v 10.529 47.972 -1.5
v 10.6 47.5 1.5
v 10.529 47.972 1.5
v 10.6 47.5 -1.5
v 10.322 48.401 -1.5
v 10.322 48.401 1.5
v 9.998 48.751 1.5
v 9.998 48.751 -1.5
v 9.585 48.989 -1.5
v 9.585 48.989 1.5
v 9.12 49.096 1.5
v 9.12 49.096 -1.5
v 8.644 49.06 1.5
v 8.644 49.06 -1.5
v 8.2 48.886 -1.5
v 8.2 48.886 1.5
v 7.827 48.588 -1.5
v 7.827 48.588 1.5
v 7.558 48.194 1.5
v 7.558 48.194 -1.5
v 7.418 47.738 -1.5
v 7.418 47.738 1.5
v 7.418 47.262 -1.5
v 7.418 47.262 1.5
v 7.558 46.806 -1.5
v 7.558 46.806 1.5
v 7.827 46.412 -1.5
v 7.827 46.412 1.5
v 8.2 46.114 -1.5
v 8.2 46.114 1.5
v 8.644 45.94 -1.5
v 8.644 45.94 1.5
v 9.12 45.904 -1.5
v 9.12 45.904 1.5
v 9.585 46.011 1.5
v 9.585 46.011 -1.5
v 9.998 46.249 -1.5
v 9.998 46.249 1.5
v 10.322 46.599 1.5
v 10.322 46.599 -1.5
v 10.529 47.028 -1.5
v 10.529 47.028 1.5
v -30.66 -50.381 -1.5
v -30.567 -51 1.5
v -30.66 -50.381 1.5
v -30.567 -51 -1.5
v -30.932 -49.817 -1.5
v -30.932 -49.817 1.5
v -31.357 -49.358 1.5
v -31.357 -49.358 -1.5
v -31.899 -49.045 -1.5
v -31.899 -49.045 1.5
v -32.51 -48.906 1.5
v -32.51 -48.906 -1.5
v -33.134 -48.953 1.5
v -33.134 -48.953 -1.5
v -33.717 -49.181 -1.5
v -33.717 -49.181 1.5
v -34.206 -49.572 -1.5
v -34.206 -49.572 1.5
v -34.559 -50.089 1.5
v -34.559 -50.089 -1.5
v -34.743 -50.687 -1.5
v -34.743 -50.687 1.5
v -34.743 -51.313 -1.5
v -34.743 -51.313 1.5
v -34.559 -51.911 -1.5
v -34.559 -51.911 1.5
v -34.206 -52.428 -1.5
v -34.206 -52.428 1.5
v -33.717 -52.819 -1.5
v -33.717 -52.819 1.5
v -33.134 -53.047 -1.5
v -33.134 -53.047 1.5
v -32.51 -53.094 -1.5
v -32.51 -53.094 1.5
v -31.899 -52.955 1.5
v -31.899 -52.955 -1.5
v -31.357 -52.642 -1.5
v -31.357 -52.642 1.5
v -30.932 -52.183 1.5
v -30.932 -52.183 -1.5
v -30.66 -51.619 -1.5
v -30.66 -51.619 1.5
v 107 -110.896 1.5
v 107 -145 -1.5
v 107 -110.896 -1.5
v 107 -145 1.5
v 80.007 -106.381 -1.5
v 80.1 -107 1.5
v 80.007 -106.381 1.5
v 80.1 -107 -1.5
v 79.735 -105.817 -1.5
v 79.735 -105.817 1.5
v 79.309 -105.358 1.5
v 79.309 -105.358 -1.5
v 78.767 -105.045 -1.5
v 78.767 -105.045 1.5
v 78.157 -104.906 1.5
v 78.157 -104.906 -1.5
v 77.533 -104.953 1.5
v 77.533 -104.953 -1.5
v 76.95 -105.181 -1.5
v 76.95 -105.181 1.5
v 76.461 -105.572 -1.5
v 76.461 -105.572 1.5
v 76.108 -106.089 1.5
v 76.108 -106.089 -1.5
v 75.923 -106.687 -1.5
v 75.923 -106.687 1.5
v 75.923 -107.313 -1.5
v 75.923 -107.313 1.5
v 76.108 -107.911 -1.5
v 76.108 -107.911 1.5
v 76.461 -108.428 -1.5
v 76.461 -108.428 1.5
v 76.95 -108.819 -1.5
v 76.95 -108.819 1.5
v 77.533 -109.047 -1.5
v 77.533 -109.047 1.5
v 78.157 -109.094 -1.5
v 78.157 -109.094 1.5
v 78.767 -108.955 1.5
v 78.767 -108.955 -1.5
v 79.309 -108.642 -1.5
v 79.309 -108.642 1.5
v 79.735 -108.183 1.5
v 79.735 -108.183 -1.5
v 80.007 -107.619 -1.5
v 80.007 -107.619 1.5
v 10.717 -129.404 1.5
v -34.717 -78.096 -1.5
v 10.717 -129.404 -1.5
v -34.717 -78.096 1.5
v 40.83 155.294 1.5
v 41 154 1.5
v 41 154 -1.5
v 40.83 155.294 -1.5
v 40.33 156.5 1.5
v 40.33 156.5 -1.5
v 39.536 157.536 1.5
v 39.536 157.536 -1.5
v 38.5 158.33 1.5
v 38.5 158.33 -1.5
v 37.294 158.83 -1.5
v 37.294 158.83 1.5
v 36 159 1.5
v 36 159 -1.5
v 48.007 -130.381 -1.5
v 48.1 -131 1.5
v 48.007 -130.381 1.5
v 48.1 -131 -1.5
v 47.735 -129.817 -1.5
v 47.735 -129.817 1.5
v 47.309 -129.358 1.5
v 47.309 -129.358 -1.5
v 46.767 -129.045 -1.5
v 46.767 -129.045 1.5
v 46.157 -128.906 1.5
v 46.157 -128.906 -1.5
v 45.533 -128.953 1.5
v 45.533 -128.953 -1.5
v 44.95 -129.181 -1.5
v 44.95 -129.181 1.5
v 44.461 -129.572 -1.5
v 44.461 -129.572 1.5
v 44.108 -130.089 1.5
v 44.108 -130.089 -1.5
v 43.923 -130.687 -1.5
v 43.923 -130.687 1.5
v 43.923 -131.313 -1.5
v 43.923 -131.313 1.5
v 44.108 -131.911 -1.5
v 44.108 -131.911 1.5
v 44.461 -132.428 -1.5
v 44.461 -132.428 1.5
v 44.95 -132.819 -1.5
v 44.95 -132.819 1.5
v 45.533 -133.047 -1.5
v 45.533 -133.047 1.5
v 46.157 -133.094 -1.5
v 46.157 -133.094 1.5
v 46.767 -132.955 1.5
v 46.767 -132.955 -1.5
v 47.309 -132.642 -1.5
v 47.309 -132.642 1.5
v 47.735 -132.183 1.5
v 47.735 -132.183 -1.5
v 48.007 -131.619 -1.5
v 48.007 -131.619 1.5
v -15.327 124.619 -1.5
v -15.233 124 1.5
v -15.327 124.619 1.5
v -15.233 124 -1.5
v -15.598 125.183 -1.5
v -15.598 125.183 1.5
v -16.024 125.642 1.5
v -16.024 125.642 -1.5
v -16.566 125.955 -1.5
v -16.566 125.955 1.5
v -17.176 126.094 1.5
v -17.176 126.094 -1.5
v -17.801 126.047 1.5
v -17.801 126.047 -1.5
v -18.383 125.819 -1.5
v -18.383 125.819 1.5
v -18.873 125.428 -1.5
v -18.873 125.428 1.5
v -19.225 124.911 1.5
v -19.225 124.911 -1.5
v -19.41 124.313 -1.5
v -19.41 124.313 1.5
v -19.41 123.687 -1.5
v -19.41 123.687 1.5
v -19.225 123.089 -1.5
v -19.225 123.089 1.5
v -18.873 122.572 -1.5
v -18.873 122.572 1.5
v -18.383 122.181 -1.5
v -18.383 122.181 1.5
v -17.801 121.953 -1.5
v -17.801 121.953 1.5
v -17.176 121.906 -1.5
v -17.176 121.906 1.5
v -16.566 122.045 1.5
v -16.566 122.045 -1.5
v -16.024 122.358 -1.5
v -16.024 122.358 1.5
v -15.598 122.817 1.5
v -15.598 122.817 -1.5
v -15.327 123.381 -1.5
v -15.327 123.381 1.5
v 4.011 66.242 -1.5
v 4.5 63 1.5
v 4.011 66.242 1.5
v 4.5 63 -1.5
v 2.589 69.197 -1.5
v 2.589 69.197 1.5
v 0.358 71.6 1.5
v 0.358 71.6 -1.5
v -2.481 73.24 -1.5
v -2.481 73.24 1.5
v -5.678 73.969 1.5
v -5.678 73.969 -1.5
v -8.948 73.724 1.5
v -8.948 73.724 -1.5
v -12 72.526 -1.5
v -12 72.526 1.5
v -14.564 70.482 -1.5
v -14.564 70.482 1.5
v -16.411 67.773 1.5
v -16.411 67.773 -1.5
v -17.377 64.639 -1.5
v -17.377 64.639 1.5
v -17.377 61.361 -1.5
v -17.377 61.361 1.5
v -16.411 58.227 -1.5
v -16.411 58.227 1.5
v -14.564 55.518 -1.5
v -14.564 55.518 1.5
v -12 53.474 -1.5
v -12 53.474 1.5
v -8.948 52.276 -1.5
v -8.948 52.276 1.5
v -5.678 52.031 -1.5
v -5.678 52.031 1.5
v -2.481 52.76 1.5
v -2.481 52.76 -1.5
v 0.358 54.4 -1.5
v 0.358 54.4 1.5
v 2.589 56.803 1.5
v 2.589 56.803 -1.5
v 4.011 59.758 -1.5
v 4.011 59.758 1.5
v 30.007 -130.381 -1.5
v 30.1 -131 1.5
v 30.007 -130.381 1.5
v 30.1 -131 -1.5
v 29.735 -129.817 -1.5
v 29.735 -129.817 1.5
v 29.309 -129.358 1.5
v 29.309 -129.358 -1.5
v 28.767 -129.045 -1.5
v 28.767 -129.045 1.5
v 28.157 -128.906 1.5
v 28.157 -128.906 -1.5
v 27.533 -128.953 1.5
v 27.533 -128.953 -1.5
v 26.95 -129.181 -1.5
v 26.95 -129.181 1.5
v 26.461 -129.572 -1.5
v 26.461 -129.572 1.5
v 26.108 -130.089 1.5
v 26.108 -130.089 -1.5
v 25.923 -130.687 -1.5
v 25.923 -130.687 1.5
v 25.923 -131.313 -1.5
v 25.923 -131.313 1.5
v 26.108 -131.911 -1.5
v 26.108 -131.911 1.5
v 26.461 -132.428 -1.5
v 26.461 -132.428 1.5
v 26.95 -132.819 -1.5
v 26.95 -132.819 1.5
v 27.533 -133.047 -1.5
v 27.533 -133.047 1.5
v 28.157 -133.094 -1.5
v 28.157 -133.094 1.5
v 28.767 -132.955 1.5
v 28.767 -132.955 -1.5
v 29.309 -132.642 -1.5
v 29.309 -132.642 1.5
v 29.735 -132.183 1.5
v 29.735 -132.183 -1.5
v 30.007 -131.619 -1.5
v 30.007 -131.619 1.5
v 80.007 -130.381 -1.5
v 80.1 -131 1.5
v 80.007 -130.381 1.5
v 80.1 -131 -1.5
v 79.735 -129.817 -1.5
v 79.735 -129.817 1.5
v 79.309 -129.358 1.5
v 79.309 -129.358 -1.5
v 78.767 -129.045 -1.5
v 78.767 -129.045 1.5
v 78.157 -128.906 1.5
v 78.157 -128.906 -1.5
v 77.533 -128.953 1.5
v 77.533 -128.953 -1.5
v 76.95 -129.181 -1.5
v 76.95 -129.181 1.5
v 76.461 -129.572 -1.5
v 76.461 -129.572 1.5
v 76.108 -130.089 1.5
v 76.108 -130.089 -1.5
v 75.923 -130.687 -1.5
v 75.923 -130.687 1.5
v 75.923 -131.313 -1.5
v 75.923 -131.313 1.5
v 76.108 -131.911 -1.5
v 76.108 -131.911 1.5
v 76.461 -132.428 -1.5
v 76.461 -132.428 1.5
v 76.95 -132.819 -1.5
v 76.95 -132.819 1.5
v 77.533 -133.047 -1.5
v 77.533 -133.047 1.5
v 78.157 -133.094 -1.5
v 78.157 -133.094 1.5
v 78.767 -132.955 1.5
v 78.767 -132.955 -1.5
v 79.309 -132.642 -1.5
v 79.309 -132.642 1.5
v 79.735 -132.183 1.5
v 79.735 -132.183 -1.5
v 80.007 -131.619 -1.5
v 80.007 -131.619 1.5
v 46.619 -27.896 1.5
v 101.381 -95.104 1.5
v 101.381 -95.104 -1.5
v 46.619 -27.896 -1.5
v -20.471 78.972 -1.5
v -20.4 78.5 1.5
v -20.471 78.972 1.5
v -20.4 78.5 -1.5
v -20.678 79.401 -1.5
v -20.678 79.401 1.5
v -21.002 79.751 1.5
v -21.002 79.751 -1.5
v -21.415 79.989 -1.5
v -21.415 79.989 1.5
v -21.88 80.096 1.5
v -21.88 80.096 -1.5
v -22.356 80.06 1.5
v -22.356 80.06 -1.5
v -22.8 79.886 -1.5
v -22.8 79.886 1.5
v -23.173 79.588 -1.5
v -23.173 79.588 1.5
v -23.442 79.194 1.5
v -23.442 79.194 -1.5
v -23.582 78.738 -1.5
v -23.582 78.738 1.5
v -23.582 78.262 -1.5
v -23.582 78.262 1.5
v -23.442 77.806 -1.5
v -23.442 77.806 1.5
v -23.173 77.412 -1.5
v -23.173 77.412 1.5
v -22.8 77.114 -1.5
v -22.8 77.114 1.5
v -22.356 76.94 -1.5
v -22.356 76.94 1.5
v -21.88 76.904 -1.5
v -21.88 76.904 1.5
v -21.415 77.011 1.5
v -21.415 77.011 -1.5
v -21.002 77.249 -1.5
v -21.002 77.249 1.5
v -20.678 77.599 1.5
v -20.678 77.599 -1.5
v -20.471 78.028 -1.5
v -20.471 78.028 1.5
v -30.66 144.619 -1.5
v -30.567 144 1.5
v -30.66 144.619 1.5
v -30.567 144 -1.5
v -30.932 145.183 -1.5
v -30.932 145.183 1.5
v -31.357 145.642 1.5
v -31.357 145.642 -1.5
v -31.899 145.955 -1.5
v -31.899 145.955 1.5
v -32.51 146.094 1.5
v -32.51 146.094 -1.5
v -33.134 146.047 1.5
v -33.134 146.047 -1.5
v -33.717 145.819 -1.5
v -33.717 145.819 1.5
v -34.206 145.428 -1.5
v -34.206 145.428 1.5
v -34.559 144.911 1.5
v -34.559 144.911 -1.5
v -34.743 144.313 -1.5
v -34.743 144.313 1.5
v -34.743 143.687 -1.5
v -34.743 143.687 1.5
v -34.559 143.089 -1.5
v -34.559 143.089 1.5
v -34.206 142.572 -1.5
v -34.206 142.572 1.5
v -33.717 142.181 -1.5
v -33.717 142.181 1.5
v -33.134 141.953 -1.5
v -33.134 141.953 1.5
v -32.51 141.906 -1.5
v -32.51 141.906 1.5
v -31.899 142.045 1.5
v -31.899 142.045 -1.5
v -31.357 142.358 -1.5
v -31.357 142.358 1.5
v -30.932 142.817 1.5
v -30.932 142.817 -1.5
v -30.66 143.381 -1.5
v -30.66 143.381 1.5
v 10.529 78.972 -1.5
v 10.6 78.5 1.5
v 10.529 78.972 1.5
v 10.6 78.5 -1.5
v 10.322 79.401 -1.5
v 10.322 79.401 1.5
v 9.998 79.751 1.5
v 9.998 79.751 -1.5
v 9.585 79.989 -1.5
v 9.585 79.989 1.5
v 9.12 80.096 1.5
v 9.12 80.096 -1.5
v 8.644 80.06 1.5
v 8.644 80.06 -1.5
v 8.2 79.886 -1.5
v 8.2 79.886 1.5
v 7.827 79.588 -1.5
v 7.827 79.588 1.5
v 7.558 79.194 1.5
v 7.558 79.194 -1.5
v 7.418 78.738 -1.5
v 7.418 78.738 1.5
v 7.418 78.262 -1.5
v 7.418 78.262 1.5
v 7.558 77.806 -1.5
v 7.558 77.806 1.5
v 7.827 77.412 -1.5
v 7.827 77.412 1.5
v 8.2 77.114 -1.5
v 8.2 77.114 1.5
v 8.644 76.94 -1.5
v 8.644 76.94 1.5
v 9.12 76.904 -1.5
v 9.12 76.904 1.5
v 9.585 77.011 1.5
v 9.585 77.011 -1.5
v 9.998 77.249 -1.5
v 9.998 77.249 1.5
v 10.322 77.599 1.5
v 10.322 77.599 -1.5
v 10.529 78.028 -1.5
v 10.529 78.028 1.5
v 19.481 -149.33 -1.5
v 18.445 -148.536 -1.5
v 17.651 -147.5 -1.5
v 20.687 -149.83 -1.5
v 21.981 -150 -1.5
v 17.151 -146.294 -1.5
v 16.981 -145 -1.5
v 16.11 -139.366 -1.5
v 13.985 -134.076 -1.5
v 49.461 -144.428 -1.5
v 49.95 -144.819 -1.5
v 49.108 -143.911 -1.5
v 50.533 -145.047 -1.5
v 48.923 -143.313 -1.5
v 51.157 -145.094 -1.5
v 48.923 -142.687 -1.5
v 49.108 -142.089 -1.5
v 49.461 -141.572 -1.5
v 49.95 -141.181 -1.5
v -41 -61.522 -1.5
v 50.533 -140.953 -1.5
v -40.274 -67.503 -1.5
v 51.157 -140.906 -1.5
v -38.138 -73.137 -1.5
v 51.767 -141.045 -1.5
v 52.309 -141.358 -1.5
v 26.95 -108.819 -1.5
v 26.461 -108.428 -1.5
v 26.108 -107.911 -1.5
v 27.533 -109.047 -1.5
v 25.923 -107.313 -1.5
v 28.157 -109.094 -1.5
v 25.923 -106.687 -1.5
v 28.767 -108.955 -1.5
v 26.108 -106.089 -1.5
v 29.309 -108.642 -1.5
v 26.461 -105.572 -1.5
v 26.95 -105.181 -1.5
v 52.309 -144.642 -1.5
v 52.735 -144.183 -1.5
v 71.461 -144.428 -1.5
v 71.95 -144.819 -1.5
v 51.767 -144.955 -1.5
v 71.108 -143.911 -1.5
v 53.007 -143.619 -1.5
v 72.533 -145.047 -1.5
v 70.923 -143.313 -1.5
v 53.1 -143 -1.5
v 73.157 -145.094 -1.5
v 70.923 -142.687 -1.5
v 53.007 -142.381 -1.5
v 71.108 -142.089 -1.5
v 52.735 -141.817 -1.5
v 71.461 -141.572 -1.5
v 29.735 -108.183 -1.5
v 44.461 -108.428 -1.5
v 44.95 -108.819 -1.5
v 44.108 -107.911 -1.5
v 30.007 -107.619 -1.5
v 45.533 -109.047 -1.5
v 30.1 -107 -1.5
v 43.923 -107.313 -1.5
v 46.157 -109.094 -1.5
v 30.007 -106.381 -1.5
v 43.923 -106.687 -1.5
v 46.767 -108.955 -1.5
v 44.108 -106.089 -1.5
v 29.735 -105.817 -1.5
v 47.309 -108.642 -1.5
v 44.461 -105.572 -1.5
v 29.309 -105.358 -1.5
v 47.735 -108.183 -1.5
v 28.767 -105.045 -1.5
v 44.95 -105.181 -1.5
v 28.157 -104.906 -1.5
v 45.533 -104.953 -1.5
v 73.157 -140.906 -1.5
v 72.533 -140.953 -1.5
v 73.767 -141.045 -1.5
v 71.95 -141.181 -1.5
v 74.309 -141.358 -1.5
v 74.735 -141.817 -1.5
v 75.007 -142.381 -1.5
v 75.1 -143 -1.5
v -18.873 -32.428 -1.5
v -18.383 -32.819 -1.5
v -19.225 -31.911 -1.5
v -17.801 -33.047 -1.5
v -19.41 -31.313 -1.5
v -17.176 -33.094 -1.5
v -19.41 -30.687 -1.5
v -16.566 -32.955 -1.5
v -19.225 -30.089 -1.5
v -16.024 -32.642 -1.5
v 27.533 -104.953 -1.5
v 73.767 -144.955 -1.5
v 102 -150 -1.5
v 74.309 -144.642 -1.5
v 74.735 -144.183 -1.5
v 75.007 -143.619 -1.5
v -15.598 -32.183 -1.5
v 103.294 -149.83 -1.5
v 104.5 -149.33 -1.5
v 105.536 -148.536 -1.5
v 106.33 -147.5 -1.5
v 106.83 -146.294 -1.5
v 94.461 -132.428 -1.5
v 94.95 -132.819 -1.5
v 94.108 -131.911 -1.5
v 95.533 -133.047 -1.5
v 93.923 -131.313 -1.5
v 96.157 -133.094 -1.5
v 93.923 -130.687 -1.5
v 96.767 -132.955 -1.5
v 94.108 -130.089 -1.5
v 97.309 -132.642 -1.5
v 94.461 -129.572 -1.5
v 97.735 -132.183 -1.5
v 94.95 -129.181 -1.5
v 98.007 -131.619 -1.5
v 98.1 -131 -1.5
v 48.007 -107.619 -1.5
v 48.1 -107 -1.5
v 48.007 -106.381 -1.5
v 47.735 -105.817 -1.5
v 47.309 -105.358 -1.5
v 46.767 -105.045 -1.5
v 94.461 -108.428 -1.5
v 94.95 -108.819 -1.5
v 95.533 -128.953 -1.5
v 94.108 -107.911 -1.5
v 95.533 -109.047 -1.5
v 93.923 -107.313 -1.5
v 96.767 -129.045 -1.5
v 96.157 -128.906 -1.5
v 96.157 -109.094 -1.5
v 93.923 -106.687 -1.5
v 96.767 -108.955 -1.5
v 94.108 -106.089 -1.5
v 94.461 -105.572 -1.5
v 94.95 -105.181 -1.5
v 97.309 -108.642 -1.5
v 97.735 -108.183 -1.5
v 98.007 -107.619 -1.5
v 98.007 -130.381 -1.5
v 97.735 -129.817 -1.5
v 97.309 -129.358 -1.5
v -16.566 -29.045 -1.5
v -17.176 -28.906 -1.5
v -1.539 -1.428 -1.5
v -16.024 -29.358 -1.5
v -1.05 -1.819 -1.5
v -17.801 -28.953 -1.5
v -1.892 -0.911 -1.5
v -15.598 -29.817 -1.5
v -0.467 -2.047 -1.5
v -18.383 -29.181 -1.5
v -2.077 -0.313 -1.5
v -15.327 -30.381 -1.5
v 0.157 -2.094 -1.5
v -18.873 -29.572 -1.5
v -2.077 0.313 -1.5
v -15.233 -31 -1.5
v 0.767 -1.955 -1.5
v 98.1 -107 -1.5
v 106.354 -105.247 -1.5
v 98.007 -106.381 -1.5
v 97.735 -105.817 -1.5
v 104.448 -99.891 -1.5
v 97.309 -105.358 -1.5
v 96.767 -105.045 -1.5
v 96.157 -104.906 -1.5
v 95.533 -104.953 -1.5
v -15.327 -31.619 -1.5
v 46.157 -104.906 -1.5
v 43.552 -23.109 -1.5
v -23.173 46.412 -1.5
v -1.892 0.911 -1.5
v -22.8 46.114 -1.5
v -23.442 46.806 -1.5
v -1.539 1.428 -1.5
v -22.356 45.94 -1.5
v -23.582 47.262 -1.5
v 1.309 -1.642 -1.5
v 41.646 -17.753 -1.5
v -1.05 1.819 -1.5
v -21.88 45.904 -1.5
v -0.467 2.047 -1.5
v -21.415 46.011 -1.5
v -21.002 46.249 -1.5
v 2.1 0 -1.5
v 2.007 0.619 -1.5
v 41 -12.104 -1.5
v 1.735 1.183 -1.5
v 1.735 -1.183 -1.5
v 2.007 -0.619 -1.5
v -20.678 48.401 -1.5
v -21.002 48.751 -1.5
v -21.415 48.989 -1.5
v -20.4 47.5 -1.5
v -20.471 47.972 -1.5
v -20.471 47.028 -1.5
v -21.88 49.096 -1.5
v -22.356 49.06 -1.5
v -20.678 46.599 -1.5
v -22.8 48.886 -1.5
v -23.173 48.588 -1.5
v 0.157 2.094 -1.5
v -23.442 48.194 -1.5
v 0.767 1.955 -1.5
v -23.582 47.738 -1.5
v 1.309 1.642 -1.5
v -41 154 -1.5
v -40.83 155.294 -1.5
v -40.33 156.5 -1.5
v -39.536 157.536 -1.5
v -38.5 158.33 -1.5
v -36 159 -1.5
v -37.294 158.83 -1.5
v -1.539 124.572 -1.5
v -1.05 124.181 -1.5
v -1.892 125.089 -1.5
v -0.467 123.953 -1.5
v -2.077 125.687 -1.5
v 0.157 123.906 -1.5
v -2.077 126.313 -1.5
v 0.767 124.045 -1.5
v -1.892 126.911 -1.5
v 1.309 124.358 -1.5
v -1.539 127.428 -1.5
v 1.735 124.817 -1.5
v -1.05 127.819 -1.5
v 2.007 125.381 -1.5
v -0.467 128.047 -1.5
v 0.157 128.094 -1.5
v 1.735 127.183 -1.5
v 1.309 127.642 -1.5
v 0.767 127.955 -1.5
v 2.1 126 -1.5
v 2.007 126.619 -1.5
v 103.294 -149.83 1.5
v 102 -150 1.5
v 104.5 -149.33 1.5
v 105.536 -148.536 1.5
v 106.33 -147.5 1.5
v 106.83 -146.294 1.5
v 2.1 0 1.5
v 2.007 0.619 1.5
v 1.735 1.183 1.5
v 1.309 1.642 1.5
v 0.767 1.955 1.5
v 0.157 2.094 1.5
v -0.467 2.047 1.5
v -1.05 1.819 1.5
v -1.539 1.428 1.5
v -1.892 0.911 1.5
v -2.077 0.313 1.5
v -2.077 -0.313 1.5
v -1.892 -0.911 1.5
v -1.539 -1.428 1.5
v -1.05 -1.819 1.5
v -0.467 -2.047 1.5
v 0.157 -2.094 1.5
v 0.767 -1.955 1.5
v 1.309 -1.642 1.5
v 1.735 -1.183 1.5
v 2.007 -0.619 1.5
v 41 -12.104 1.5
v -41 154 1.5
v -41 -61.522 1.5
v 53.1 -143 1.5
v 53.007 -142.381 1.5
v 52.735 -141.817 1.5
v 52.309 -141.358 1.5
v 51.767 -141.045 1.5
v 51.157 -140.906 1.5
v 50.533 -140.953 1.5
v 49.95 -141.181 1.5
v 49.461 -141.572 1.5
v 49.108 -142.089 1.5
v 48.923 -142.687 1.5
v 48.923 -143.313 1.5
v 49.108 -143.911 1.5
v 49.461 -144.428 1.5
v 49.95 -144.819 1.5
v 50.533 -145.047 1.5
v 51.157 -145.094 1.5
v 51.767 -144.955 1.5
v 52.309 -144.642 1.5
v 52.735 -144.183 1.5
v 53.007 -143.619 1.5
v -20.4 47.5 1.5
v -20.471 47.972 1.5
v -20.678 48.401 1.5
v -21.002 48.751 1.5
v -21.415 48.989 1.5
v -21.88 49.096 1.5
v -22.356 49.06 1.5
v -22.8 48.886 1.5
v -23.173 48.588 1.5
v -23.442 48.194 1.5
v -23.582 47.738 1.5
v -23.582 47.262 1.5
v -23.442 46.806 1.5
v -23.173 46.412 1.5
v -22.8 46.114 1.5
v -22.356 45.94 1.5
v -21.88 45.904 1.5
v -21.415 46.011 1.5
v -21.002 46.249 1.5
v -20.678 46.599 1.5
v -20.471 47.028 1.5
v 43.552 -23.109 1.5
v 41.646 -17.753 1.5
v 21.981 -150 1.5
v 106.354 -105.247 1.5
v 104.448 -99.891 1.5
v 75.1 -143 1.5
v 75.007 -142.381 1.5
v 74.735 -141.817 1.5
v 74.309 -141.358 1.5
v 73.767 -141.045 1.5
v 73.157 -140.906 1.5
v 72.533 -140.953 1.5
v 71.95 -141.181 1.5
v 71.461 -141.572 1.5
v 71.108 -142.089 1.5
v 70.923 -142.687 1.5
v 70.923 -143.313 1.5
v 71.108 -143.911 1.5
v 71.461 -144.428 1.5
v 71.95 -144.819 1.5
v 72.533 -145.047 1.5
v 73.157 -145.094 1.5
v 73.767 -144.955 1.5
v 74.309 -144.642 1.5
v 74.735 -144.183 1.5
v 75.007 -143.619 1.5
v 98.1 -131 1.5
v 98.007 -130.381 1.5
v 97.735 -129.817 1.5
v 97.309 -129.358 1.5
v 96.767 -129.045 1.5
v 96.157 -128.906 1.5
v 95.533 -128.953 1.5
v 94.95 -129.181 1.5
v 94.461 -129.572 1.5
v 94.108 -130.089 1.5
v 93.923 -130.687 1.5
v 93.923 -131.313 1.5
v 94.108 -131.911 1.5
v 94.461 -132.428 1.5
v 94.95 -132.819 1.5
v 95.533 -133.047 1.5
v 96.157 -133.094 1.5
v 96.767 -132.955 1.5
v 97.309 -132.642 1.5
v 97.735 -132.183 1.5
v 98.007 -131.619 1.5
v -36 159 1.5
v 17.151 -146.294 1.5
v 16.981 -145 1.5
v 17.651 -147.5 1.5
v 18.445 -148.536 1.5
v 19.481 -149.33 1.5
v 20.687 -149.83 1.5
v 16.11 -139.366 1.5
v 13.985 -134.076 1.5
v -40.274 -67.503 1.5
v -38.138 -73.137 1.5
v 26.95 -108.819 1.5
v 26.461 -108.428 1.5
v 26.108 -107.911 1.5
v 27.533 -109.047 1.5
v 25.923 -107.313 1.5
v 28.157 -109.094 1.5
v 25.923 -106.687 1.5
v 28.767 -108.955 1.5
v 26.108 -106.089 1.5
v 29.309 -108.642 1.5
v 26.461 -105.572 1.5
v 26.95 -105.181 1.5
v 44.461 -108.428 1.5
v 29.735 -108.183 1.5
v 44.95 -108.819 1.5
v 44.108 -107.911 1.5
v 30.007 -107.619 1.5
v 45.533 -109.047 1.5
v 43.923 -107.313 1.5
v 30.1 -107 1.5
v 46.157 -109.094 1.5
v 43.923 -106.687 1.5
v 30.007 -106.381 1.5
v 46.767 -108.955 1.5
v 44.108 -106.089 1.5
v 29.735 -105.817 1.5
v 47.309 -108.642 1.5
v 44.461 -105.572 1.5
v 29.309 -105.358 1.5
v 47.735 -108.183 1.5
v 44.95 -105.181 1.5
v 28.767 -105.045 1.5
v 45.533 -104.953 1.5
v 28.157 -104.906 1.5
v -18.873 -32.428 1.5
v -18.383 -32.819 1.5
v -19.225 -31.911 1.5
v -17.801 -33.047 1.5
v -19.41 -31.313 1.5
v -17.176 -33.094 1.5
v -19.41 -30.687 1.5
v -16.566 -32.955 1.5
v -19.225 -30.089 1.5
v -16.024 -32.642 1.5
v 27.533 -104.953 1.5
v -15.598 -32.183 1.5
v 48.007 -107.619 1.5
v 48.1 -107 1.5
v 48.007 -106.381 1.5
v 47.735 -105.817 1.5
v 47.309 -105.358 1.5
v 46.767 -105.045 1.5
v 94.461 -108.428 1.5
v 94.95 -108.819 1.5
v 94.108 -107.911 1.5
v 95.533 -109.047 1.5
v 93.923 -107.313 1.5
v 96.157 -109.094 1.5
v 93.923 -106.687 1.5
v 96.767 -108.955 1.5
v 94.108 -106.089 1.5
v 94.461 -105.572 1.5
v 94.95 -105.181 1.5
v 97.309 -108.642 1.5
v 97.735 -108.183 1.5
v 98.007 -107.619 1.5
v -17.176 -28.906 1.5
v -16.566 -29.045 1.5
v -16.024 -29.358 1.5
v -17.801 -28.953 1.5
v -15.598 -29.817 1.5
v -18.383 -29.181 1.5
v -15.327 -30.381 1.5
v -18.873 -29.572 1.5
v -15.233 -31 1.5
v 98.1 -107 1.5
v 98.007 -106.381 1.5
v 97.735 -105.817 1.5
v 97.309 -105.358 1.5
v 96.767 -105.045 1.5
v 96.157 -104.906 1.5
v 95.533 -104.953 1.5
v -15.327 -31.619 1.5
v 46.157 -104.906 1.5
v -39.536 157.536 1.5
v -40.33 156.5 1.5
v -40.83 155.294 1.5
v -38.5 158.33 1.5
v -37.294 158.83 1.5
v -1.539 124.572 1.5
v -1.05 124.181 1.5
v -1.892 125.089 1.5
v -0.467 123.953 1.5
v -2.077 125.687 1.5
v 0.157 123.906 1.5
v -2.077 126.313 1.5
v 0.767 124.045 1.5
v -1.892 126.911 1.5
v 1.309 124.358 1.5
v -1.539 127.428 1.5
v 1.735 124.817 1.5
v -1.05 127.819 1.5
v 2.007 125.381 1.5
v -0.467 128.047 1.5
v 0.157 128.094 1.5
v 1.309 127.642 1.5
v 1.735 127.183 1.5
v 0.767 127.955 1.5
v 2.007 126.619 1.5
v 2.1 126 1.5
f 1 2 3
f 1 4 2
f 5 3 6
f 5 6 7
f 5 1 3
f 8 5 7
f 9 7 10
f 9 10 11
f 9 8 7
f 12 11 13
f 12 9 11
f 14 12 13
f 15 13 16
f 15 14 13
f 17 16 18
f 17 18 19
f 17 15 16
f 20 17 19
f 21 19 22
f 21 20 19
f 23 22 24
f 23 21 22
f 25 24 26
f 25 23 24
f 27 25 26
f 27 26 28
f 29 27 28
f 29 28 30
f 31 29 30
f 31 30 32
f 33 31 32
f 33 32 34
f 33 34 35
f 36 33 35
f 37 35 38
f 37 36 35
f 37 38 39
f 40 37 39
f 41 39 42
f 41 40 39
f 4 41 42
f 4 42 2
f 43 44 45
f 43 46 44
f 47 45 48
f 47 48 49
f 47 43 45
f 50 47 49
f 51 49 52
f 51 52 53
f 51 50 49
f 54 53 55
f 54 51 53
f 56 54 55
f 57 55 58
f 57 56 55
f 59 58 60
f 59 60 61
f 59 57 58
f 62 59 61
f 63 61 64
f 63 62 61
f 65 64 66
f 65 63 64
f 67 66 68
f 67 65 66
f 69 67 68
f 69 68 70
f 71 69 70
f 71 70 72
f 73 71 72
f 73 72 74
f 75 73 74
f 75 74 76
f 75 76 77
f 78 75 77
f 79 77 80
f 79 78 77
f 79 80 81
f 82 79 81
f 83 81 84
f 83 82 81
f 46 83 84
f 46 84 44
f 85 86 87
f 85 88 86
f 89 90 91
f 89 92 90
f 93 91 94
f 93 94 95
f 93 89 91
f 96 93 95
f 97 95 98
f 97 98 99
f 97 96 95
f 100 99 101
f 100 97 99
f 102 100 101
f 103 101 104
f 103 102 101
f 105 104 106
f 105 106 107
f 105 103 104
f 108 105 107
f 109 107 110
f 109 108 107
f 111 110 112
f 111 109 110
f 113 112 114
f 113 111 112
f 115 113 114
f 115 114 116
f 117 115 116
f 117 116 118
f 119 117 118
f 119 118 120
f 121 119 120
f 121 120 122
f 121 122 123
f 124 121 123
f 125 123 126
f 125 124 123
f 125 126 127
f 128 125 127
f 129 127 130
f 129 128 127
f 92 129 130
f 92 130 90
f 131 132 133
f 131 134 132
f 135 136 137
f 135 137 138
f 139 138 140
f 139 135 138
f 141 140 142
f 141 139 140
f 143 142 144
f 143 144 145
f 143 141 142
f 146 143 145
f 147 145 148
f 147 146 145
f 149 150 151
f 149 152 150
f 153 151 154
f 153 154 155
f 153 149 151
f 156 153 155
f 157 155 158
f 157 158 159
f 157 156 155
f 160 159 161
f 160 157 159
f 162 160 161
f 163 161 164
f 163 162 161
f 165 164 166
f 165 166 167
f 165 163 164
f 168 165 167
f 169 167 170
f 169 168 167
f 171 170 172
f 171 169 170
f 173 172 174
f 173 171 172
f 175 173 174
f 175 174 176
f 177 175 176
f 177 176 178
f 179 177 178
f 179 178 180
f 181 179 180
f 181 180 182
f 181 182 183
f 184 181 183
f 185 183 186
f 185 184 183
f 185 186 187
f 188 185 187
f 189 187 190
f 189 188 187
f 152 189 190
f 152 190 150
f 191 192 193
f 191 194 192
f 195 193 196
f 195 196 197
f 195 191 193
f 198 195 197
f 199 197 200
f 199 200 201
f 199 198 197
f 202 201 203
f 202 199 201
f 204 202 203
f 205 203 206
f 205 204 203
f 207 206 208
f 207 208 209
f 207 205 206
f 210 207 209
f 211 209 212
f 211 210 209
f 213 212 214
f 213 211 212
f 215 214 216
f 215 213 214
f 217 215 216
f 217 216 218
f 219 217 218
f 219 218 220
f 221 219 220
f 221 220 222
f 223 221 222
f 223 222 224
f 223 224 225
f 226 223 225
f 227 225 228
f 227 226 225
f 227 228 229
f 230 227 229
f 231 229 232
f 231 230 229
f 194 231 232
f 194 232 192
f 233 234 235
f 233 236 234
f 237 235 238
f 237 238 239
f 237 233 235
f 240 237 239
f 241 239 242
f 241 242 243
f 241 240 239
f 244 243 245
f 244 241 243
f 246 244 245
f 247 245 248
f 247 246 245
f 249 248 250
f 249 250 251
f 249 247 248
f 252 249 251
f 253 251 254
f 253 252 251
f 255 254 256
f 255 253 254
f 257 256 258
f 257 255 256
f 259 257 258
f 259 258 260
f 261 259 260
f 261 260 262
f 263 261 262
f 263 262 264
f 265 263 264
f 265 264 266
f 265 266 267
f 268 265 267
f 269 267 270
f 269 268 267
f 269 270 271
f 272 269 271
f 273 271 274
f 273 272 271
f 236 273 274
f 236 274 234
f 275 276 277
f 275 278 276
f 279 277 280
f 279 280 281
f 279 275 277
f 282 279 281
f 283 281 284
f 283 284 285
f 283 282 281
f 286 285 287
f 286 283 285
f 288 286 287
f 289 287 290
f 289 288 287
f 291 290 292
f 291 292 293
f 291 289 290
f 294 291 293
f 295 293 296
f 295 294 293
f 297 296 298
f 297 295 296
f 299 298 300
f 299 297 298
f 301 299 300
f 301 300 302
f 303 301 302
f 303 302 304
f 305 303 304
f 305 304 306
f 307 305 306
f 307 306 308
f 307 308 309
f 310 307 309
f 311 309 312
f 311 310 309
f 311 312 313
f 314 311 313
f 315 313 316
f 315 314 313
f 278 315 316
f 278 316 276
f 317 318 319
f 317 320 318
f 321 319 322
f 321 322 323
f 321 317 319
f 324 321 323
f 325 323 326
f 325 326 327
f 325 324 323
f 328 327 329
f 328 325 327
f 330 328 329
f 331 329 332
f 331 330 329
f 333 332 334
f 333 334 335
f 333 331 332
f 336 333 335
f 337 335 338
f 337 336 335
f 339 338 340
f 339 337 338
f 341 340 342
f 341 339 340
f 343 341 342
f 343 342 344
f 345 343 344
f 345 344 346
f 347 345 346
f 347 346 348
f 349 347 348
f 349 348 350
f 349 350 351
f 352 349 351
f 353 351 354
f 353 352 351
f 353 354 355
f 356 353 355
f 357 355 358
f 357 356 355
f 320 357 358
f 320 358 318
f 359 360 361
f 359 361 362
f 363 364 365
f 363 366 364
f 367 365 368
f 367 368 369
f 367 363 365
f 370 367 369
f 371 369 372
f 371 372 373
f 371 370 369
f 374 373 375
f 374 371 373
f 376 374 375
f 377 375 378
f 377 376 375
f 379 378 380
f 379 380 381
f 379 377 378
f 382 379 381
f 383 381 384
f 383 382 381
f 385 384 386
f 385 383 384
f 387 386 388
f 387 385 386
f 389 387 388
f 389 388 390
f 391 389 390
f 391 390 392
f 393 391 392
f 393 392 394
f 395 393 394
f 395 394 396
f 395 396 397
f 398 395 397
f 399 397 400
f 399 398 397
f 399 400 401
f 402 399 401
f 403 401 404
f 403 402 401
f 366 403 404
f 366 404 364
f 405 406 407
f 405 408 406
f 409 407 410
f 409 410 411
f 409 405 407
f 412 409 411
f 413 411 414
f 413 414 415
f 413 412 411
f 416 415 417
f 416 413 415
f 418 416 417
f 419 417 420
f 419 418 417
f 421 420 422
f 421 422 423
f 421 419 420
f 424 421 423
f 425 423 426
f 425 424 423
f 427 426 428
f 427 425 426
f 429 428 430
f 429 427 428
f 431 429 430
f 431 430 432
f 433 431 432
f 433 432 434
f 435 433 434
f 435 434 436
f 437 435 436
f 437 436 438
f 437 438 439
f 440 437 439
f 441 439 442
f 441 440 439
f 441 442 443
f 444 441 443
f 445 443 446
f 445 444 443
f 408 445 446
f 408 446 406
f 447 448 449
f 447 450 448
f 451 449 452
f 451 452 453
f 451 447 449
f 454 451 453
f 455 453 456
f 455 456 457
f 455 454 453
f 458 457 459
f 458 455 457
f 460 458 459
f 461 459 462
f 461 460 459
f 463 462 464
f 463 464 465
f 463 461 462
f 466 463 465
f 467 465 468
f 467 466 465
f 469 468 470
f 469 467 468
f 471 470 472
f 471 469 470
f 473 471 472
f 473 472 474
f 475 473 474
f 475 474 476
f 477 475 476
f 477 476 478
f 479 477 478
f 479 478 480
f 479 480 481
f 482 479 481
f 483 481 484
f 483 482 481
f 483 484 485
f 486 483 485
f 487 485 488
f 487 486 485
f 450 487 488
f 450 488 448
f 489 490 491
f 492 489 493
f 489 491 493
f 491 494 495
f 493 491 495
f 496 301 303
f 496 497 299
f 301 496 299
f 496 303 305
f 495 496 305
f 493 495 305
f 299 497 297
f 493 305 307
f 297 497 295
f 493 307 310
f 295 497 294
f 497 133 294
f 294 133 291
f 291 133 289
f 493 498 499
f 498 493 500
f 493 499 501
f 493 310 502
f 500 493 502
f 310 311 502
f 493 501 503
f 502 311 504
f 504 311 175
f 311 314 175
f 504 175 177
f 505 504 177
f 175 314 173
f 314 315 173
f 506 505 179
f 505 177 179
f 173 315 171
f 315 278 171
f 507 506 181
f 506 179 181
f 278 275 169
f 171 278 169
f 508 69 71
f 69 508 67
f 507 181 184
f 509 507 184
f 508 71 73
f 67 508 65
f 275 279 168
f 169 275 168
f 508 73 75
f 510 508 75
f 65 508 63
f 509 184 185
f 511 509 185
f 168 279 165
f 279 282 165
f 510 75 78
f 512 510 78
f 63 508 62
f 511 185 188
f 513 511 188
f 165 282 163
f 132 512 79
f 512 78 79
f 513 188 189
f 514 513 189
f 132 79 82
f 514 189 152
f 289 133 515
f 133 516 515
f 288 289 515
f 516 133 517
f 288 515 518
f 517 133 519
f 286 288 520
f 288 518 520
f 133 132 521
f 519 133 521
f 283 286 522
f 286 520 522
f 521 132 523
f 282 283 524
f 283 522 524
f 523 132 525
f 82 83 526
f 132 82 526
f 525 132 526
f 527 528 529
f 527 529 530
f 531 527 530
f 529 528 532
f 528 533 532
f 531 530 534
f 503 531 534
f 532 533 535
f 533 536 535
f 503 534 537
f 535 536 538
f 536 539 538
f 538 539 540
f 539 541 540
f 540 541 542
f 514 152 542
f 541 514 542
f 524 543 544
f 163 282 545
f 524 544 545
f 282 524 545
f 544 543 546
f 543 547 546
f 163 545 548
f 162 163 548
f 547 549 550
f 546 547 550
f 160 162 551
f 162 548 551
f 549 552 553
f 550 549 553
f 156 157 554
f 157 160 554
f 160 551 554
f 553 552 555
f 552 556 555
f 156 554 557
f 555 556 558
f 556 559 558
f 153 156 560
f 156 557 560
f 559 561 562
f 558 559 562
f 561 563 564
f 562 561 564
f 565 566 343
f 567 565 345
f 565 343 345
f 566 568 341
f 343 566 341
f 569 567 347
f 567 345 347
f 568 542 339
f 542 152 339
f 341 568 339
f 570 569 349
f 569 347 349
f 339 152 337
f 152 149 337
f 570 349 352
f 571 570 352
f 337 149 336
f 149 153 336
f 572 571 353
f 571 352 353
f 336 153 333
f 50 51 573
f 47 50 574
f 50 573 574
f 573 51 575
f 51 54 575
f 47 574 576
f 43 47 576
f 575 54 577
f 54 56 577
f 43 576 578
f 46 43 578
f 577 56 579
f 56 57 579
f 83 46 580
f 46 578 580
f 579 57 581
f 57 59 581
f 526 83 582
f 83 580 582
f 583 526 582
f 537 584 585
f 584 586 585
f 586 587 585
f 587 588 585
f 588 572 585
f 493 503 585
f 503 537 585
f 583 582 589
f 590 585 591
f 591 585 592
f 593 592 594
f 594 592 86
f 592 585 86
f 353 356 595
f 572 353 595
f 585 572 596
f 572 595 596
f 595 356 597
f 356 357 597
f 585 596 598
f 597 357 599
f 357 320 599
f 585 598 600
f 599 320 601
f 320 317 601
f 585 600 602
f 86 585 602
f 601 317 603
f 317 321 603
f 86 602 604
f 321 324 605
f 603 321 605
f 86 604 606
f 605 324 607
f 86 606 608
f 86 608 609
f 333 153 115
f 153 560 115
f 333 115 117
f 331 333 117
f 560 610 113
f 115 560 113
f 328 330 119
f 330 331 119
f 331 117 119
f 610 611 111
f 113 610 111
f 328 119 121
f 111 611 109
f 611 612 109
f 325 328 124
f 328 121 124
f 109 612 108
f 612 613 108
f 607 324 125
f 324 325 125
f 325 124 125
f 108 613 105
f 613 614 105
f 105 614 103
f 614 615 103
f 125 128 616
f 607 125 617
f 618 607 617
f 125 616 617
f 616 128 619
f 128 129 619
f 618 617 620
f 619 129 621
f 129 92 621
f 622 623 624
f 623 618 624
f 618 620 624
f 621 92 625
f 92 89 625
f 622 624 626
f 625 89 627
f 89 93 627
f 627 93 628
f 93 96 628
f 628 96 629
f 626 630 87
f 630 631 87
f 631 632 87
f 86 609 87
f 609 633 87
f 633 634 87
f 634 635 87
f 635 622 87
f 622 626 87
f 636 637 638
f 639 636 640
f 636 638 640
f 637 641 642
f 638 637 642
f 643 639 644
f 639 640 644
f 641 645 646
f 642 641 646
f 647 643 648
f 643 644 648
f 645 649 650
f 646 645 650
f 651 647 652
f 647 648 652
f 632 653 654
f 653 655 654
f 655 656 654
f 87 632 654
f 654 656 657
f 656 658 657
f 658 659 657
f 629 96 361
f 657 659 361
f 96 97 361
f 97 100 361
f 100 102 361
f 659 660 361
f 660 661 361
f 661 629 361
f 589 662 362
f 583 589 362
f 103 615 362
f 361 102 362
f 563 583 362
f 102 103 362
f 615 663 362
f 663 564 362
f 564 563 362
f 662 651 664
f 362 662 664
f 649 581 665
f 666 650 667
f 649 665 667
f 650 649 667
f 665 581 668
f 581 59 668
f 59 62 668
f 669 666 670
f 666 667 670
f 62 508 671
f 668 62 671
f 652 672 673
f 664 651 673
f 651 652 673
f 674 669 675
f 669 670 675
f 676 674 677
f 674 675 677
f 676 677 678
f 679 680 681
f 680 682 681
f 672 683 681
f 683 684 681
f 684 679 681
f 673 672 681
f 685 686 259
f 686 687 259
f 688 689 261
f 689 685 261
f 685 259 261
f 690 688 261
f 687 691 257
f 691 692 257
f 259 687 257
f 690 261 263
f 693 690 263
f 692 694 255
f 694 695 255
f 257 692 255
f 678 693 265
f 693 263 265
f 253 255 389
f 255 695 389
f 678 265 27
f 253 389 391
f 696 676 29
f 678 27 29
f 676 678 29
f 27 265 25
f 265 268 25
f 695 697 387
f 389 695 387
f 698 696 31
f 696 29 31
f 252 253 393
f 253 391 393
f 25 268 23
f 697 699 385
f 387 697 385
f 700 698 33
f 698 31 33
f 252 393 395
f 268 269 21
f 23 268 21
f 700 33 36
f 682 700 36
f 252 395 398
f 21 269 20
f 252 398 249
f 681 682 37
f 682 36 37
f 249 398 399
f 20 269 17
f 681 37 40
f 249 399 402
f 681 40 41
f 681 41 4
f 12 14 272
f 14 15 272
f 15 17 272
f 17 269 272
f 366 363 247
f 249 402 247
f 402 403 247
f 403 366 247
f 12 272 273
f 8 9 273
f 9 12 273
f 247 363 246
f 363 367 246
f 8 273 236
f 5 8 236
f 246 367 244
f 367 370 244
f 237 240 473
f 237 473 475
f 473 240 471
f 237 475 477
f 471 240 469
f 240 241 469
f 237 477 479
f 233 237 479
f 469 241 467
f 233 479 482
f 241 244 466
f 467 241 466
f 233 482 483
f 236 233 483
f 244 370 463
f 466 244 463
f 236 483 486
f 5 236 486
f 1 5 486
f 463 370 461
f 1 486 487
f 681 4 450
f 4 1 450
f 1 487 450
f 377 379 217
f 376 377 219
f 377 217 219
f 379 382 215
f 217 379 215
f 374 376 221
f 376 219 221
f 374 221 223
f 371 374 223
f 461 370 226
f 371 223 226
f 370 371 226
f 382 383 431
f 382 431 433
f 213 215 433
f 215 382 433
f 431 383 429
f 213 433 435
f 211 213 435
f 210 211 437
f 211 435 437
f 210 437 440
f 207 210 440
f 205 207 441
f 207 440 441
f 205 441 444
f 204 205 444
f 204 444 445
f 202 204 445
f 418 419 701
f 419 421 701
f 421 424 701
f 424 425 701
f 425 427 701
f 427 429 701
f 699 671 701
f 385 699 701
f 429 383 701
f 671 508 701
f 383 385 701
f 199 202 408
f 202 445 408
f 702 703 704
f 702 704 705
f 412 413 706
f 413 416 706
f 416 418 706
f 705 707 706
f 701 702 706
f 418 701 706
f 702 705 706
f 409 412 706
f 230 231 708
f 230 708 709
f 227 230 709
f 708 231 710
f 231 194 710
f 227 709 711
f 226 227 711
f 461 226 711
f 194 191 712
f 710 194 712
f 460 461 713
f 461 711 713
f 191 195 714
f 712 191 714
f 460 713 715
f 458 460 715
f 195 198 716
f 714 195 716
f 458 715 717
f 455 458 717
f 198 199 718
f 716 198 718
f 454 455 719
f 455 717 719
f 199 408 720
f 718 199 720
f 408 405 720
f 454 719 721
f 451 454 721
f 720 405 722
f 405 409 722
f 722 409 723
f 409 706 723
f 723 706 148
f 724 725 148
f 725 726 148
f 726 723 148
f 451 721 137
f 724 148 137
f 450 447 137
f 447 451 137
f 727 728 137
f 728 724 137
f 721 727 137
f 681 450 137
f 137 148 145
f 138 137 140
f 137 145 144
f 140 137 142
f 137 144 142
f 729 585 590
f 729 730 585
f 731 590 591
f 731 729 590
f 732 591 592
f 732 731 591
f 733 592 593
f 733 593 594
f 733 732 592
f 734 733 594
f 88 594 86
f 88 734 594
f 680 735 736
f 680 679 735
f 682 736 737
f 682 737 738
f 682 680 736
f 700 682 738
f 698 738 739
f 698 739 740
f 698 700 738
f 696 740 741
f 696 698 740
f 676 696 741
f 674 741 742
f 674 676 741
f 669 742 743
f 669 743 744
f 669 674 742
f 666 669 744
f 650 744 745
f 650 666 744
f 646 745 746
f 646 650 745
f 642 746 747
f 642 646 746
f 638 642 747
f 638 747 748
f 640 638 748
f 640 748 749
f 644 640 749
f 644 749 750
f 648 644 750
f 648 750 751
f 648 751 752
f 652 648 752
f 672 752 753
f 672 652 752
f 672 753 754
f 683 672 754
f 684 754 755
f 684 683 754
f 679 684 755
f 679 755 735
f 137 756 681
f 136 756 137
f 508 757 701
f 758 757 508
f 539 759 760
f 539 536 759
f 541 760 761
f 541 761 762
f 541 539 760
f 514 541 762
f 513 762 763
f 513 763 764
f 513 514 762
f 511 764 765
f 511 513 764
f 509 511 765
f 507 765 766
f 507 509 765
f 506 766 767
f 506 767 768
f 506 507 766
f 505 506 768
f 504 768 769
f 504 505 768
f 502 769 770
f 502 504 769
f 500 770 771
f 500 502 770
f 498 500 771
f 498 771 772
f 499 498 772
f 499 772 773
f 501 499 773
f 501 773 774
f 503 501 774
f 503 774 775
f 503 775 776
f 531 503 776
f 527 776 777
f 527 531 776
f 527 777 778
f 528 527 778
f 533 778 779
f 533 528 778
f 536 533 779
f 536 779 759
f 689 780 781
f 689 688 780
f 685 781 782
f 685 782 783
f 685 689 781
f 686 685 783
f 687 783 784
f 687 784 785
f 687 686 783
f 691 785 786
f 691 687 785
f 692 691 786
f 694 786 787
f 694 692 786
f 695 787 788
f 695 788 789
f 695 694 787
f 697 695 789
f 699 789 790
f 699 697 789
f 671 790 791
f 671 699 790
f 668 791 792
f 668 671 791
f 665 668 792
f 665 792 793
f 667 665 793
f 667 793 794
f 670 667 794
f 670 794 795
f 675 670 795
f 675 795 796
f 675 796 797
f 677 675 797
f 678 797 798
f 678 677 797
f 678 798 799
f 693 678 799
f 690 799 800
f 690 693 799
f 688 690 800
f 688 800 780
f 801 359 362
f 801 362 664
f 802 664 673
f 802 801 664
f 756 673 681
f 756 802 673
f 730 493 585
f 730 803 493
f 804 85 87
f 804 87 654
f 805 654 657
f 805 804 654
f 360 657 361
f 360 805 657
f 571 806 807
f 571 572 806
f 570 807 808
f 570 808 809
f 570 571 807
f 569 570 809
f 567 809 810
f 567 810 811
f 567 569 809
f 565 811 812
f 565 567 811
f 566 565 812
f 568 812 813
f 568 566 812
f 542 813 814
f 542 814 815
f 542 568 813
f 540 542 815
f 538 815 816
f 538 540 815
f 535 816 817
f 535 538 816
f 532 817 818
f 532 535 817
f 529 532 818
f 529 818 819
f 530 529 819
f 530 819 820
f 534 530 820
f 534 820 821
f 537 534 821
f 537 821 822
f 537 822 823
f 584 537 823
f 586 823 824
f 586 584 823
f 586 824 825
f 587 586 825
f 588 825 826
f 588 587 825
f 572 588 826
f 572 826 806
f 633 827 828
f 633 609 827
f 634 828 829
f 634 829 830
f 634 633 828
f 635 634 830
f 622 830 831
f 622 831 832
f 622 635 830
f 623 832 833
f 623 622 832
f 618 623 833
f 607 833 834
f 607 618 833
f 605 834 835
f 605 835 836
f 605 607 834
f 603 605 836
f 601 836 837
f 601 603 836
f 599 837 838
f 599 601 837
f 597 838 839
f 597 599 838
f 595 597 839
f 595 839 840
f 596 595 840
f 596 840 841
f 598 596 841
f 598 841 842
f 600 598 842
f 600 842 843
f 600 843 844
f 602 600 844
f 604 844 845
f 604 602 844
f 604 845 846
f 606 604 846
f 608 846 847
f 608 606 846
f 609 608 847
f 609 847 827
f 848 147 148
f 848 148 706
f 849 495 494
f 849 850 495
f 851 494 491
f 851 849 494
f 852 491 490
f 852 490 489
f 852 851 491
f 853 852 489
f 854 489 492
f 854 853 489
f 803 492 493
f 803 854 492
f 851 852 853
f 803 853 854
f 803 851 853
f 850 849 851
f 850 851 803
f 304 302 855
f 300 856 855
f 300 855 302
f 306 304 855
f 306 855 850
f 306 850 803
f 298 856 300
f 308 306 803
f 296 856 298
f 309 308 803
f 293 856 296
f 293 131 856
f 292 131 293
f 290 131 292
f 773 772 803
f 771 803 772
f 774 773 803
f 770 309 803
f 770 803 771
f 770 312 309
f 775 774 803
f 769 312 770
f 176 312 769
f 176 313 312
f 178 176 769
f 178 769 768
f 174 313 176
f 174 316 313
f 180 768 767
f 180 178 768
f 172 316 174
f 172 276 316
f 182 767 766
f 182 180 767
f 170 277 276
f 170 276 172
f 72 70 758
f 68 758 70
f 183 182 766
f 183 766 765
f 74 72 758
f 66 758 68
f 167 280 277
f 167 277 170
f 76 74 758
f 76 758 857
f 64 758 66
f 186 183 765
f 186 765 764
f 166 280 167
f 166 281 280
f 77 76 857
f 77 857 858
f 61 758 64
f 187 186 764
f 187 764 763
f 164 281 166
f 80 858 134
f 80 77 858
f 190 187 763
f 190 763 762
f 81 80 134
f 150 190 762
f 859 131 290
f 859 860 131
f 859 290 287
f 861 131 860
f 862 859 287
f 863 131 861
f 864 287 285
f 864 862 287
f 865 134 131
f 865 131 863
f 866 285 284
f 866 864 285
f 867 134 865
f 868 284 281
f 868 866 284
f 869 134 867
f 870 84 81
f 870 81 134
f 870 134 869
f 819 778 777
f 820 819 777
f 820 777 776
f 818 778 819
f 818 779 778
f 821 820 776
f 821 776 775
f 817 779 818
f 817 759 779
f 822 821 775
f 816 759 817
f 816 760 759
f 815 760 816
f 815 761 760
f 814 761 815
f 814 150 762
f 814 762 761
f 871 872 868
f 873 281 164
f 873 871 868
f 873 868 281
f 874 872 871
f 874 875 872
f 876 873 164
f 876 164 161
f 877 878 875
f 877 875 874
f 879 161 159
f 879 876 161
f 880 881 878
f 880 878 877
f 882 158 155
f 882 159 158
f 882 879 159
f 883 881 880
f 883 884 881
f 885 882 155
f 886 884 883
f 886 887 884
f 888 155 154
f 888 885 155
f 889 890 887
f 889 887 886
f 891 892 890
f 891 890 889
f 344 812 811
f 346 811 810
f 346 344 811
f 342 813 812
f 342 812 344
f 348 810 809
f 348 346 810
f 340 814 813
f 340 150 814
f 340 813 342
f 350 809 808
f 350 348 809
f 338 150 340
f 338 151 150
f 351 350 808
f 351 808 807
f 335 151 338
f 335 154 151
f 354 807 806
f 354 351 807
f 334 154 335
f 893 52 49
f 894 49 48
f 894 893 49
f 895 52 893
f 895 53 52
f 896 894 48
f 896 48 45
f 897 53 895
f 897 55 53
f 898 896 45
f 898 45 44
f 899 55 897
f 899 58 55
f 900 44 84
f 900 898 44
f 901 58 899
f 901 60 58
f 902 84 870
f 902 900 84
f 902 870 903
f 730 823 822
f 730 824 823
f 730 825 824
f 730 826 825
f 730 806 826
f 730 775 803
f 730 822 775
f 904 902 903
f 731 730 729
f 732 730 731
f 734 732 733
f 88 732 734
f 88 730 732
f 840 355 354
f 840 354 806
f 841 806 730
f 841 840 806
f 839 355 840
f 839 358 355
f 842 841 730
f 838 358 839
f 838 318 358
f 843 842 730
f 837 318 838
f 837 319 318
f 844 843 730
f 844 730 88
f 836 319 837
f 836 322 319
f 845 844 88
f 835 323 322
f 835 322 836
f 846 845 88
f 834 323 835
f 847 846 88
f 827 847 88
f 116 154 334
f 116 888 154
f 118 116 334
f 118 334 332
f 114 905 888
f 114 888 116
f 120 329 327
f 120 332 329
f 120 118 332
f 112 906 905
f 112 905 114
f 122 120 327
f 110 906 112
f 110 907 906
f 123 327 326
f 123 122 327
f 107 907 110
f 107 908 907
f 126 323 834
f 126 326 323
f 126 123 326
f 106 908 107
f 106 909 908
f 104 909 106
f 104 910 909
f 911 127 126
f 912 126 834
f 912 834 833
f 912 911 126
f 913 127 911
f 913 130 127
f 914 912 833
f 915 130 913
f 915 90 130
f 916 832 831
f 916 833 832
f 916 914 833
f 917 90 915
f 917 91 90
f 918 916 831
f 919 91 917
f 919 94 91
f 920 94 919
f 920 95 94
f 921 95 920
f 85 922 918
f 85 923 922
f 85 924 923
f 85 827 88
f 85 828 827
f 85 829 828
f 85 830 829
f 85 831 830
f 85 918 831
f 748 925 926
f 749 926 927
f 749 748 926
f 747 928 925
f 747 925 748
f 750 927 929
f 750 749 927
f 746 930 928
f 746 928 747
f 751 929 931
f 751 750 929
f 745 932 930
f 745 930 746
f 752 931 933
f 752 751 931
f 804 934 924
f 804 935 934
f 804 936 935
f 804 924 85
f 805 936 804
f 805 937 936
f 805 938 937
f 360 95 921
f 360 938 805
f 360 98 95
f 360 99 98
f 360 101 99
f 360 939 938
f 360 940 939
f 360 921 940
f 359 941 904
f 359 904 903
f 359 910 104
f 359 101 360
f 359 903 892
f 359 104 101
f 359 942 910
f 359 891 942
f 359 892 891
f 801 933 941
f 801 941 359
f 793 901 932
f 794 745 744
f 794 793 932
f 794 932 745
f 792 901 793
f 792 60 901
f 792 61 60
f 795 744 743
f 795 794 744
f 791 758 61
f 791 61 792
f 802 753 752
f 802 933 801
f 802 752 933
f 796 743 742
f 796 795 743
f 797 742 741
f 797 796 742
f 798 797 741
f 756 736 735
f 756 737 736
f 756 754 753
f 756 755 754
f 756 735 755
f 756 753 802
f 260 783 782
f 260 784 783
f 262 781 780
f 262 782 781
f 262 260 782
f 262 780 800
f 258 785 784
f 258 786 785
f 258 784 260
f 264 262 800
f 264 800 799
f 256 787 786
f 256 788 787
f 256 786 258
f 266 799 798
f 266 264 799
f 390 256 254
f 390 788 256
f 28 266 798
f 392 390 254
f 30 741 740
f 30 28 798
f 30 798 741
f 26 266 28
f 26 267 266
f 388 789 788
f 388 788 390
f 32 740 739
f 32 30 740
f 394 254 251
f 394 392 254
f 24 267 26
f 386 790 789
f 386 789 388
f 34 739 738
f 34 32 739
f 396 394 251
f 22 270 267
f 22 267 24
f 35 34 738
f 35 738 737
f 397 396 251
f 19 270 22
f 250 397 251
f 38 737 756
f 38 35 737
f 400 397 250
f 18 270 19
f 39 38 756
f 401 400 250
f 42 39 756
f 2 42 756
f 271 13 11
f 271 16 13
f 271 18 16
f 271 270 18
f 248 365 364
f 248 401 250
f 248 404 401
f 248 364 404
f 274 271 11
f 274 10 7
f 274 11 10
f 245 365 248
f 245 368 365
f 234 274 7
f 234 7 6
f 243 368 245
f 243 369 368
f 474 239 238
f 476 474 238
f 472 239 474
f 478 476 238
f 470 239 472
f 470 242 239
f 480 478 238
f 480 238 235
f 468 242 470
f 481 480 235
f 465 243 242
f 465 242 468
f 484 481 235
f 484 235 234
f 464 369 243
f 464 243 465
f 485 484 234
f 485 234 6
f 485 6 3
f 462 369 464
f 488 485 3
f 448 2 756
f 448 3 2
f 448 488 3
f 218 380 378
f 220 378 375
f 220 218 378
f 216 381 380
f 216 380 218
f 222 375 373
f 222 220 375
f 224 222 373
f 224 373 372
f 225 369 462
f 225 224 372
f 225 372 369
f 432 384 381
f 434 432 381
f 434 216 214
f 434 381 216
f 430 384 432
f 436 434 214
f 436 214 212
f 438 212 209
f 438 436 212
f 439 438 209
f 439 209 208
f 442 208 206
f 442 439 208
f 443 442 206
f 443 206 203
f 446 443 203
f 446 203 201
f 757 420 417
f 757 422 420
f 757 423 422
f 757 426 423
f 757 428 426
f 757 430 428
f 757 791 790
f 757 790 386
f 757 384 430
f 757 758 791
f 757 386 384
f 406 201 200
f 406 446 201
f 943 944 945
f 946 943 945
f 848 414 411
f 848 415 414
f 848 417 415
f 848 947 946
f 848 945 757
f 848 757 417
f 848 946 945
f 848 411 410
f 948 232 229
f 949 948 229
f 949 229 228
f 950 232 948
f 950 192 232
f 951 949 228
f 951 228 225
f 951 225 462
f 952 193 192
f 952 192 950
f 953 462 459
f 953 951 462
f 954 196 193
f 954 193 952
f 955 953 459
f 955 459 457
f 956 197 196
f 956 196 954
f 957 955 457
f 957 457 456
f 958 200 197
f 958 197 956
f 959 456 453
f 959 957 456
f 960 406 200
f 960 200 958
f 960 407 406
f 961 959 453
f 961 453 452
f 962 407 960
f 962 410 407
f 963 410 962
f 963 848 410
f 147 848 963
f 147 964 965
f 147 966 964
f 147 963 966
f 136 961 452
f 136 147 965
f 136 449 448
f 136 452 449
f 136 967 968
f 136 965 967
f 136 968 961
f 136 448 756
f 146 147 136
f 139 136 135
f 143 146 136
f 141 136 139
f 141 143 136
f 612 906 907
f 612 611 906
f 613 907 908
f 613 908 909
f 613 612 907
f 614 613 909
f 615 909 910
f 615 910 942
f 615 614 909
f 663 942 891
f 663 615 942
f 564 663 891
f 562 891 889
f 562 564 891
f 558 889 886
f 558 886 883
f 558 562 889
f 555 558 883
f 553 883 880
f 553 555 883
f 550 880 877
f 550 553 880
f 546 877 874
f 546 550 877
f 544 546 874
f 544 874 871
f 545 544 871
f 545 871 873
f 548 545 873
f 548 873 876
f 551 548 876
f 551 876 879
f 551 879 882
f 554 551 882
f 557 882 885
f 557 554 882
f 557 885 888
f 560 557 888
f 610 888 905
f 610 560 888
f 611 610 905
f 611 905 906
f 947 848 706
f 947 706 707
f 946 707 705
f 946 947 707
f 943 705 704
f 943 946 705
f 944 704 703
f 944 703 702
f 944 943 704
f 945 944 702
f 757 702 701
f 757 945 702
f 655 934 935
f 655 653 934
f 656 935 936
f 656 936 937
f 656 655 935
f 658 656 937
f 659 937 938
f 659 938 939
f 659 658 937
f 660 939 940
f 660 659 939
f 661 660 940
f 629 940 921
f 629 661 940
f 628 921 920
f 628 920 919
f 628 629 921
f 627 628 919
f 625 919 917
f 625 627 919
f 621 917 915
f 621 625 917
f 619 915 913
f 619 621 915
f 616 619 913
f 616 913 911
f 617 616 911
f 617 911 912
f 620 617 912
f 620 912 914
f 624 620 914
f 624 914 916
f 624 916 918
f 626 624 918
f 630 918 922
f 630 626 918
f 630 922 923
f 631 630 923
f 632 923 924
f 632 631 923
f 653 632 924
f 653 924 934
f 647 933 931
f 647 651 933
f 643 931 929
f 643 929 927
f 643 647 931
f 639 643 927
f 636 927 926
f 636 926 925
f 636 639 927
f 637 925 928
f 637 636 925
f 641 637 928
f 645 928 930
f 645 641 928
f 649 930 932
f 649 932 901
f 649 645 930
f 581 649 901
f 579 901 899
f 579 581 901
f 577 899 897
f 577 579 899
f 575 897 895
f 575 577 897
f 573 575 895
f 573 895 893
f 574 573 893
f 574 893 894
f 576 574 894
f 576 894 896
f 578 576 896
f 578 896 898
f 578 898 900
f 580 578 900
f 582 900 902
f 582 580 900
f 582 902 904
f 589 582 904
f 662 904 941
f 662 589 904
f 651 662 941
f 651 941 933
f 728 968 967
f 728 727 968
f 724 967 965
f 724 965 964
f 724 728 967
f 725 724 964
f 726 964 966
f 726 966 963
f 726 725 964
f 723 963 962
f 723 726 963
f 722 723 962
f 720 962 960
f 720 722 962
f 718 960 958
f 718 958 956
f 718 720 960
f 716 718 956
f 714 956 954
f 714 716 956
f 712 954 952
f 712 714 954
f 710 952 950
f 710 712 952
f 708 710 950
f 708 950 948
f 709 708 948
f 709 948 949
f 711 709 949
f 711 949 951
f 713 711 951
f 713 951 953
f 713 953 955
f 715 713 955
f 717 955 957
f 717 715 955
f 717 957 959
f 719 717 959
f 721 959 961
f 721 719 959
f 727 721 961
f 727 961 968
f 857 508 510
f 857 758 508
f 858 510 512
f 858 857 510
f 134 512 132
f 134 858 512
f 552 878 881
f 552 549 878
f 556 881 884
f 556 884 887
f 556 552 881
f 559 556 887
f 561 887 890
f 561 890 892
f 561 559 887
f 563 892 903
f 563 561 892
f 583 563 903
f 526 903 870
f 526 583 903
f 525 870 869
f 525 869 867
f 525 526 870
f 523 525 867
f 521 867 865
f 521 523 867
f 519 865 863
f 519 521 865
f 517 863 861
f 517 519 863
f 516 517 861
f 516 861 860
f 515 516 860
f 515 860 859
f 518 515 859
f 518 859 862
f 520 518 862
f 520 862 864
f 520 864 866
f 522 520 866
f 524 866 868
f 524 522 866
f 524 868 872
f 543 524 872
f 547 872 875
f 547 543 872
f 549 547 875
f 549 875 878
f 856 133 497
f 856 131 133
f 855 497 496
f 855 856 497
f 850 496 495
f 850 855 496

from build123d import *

# Parameters (mm, degrees)
SKETCH1_R           = 2.1
SKETCH1_R_2         = 11
SKETCH1_R_3         = 1.6
BOSS_EXTRUDE1_DEPTH = 1.5


with BuildPart() as part:
    # Sketch1 → Boss-Extrude1 (new body, symmetric)
    with BuildSketch(Plane.XY):
        with BuildLine():
            Line((107, -145), (107, -110.895624471))
            ThreePointArc((107, -110.895624471), (105.553363517, -102.514749396), (101.380874638, -95.103800692))
            Line((101.380874638, -95.103800692), (46.619125362, -27.896199308))
            ThreePointArc((46.619125362, -27.896199308), (42.446636483, -20.485250604), (41, -12.104375529))
            Line((41, -12.104375529), (41, 154))
            ThreePointArc((41, 154), (39.535533906, 157.535533906), (36, 159))
            Line((36, 159), (-36, 159))
            ThreePointArc((-36, 159), (-39.535533906, 157.535533906), (-41, 154))
            Line((-41, 154), (-41, -61.522167809))
            ThreePointArc((-41, -61.522167809), (-39.376465331, -70.384496434), (-34.716730508, -78.095761236))
            Line((-34.716730508, -78.095761236), (10.716730508, -129.404238764))
            ThreePointArc((10.716730508, -129.404238764), (15.198642313, -136.659946441), (16.980869565, -145))
            ThreePointArc((16.980869565, -145), (18.445335659, -148.535533906), (21.980869565, -150))
            Line((21.980869565, -150), (102, -150))
            ThreePointArc((102, -150), (105.535533906, -148.535533906), (107, -145))
        make_face()
        with Locations((96, -107)):
            Circle(SKETCH1_R, mode=Mode.SUBTRACT)
        with Locations((96, -131)):
            Circle(SKETCH1_R, mode=Mode.SUBTRACT)
        with Locations((78, -107)):
            Circle(SKETCH1_R, mode=Mode.SUBTRACT)
        with Locations((78, -131)):
            Circle(SKETCH1_R, mode=Mode.SUBTRACT)
        with Locations((46, -107)):
            Circle(SKETCH1_R, mode=Mode.SUBTRACT)
        with Locations((46, -131)):
            Circle(SKETCH1_R, mode=Mode.SUBTRACT)
        with Locations((28, -107)):
            Circle(SKETCH1_R, mode=Mode.SUBTRACT)
        with Locations((28, -131)):
            Circle(SKETCH1_R, mode=Mode.SUBTRACT)
        with Locations((51, -143)):
            Circle(SKETCH1_R, mode=Mode.SUBTRACT)
        with Locations((73, -143)):
            Circle(SKETCH1_R, mode=Mode.SUBTRACT)
        with Locations((0, 126)):
            Circle(SKETCH1_R, mode=Mode.SUBTRACT)
        Circle(SKETCH1_R, mode=Mode.SUBTRACT)
        with Locations((-32.666666667, 144)):
            Circle(SKETCH1_R, mode=Mode.SUBTRACT)
        with Locations((-17.333333333, 124)):
            Circle(SKETCH1_R, mode=Mode.SUBTRACT)
        with Locations((-17.333333333, -31)):
            Circle(SKETCH1_R, mode=Mode.SUBTRACT)
        with Locations((-32.666666667, -51)):
            Circle(SKETCH1_R, mode=Mode.SUBTRACT)
        with Locations((-6.5, 63)):
            Circle(SKETCH1_R_2, mode=Mode.SUBTRACT)
        with Locations((-22, 78.5)):
            Circle(SKETCH1_R_3, mode=Mode.SUBTRACT)
        with Locations((9, 78.5)):
            Circle(SKETCH1_R_3, mode=Mode.SUBTRACT)
        with Locations((-22, 47.5)):
            Circle(SKETCH1_R_3, mode=Mode.SUBTRACT)
        with Locations((9, 47.5)):
            Circle(SKETCH1_R_3, mode=Mode.SUBTRACT)
    extrude(amount=BOSS_EXTRUDE1_DEPTH, both=True)


solid = part.part
